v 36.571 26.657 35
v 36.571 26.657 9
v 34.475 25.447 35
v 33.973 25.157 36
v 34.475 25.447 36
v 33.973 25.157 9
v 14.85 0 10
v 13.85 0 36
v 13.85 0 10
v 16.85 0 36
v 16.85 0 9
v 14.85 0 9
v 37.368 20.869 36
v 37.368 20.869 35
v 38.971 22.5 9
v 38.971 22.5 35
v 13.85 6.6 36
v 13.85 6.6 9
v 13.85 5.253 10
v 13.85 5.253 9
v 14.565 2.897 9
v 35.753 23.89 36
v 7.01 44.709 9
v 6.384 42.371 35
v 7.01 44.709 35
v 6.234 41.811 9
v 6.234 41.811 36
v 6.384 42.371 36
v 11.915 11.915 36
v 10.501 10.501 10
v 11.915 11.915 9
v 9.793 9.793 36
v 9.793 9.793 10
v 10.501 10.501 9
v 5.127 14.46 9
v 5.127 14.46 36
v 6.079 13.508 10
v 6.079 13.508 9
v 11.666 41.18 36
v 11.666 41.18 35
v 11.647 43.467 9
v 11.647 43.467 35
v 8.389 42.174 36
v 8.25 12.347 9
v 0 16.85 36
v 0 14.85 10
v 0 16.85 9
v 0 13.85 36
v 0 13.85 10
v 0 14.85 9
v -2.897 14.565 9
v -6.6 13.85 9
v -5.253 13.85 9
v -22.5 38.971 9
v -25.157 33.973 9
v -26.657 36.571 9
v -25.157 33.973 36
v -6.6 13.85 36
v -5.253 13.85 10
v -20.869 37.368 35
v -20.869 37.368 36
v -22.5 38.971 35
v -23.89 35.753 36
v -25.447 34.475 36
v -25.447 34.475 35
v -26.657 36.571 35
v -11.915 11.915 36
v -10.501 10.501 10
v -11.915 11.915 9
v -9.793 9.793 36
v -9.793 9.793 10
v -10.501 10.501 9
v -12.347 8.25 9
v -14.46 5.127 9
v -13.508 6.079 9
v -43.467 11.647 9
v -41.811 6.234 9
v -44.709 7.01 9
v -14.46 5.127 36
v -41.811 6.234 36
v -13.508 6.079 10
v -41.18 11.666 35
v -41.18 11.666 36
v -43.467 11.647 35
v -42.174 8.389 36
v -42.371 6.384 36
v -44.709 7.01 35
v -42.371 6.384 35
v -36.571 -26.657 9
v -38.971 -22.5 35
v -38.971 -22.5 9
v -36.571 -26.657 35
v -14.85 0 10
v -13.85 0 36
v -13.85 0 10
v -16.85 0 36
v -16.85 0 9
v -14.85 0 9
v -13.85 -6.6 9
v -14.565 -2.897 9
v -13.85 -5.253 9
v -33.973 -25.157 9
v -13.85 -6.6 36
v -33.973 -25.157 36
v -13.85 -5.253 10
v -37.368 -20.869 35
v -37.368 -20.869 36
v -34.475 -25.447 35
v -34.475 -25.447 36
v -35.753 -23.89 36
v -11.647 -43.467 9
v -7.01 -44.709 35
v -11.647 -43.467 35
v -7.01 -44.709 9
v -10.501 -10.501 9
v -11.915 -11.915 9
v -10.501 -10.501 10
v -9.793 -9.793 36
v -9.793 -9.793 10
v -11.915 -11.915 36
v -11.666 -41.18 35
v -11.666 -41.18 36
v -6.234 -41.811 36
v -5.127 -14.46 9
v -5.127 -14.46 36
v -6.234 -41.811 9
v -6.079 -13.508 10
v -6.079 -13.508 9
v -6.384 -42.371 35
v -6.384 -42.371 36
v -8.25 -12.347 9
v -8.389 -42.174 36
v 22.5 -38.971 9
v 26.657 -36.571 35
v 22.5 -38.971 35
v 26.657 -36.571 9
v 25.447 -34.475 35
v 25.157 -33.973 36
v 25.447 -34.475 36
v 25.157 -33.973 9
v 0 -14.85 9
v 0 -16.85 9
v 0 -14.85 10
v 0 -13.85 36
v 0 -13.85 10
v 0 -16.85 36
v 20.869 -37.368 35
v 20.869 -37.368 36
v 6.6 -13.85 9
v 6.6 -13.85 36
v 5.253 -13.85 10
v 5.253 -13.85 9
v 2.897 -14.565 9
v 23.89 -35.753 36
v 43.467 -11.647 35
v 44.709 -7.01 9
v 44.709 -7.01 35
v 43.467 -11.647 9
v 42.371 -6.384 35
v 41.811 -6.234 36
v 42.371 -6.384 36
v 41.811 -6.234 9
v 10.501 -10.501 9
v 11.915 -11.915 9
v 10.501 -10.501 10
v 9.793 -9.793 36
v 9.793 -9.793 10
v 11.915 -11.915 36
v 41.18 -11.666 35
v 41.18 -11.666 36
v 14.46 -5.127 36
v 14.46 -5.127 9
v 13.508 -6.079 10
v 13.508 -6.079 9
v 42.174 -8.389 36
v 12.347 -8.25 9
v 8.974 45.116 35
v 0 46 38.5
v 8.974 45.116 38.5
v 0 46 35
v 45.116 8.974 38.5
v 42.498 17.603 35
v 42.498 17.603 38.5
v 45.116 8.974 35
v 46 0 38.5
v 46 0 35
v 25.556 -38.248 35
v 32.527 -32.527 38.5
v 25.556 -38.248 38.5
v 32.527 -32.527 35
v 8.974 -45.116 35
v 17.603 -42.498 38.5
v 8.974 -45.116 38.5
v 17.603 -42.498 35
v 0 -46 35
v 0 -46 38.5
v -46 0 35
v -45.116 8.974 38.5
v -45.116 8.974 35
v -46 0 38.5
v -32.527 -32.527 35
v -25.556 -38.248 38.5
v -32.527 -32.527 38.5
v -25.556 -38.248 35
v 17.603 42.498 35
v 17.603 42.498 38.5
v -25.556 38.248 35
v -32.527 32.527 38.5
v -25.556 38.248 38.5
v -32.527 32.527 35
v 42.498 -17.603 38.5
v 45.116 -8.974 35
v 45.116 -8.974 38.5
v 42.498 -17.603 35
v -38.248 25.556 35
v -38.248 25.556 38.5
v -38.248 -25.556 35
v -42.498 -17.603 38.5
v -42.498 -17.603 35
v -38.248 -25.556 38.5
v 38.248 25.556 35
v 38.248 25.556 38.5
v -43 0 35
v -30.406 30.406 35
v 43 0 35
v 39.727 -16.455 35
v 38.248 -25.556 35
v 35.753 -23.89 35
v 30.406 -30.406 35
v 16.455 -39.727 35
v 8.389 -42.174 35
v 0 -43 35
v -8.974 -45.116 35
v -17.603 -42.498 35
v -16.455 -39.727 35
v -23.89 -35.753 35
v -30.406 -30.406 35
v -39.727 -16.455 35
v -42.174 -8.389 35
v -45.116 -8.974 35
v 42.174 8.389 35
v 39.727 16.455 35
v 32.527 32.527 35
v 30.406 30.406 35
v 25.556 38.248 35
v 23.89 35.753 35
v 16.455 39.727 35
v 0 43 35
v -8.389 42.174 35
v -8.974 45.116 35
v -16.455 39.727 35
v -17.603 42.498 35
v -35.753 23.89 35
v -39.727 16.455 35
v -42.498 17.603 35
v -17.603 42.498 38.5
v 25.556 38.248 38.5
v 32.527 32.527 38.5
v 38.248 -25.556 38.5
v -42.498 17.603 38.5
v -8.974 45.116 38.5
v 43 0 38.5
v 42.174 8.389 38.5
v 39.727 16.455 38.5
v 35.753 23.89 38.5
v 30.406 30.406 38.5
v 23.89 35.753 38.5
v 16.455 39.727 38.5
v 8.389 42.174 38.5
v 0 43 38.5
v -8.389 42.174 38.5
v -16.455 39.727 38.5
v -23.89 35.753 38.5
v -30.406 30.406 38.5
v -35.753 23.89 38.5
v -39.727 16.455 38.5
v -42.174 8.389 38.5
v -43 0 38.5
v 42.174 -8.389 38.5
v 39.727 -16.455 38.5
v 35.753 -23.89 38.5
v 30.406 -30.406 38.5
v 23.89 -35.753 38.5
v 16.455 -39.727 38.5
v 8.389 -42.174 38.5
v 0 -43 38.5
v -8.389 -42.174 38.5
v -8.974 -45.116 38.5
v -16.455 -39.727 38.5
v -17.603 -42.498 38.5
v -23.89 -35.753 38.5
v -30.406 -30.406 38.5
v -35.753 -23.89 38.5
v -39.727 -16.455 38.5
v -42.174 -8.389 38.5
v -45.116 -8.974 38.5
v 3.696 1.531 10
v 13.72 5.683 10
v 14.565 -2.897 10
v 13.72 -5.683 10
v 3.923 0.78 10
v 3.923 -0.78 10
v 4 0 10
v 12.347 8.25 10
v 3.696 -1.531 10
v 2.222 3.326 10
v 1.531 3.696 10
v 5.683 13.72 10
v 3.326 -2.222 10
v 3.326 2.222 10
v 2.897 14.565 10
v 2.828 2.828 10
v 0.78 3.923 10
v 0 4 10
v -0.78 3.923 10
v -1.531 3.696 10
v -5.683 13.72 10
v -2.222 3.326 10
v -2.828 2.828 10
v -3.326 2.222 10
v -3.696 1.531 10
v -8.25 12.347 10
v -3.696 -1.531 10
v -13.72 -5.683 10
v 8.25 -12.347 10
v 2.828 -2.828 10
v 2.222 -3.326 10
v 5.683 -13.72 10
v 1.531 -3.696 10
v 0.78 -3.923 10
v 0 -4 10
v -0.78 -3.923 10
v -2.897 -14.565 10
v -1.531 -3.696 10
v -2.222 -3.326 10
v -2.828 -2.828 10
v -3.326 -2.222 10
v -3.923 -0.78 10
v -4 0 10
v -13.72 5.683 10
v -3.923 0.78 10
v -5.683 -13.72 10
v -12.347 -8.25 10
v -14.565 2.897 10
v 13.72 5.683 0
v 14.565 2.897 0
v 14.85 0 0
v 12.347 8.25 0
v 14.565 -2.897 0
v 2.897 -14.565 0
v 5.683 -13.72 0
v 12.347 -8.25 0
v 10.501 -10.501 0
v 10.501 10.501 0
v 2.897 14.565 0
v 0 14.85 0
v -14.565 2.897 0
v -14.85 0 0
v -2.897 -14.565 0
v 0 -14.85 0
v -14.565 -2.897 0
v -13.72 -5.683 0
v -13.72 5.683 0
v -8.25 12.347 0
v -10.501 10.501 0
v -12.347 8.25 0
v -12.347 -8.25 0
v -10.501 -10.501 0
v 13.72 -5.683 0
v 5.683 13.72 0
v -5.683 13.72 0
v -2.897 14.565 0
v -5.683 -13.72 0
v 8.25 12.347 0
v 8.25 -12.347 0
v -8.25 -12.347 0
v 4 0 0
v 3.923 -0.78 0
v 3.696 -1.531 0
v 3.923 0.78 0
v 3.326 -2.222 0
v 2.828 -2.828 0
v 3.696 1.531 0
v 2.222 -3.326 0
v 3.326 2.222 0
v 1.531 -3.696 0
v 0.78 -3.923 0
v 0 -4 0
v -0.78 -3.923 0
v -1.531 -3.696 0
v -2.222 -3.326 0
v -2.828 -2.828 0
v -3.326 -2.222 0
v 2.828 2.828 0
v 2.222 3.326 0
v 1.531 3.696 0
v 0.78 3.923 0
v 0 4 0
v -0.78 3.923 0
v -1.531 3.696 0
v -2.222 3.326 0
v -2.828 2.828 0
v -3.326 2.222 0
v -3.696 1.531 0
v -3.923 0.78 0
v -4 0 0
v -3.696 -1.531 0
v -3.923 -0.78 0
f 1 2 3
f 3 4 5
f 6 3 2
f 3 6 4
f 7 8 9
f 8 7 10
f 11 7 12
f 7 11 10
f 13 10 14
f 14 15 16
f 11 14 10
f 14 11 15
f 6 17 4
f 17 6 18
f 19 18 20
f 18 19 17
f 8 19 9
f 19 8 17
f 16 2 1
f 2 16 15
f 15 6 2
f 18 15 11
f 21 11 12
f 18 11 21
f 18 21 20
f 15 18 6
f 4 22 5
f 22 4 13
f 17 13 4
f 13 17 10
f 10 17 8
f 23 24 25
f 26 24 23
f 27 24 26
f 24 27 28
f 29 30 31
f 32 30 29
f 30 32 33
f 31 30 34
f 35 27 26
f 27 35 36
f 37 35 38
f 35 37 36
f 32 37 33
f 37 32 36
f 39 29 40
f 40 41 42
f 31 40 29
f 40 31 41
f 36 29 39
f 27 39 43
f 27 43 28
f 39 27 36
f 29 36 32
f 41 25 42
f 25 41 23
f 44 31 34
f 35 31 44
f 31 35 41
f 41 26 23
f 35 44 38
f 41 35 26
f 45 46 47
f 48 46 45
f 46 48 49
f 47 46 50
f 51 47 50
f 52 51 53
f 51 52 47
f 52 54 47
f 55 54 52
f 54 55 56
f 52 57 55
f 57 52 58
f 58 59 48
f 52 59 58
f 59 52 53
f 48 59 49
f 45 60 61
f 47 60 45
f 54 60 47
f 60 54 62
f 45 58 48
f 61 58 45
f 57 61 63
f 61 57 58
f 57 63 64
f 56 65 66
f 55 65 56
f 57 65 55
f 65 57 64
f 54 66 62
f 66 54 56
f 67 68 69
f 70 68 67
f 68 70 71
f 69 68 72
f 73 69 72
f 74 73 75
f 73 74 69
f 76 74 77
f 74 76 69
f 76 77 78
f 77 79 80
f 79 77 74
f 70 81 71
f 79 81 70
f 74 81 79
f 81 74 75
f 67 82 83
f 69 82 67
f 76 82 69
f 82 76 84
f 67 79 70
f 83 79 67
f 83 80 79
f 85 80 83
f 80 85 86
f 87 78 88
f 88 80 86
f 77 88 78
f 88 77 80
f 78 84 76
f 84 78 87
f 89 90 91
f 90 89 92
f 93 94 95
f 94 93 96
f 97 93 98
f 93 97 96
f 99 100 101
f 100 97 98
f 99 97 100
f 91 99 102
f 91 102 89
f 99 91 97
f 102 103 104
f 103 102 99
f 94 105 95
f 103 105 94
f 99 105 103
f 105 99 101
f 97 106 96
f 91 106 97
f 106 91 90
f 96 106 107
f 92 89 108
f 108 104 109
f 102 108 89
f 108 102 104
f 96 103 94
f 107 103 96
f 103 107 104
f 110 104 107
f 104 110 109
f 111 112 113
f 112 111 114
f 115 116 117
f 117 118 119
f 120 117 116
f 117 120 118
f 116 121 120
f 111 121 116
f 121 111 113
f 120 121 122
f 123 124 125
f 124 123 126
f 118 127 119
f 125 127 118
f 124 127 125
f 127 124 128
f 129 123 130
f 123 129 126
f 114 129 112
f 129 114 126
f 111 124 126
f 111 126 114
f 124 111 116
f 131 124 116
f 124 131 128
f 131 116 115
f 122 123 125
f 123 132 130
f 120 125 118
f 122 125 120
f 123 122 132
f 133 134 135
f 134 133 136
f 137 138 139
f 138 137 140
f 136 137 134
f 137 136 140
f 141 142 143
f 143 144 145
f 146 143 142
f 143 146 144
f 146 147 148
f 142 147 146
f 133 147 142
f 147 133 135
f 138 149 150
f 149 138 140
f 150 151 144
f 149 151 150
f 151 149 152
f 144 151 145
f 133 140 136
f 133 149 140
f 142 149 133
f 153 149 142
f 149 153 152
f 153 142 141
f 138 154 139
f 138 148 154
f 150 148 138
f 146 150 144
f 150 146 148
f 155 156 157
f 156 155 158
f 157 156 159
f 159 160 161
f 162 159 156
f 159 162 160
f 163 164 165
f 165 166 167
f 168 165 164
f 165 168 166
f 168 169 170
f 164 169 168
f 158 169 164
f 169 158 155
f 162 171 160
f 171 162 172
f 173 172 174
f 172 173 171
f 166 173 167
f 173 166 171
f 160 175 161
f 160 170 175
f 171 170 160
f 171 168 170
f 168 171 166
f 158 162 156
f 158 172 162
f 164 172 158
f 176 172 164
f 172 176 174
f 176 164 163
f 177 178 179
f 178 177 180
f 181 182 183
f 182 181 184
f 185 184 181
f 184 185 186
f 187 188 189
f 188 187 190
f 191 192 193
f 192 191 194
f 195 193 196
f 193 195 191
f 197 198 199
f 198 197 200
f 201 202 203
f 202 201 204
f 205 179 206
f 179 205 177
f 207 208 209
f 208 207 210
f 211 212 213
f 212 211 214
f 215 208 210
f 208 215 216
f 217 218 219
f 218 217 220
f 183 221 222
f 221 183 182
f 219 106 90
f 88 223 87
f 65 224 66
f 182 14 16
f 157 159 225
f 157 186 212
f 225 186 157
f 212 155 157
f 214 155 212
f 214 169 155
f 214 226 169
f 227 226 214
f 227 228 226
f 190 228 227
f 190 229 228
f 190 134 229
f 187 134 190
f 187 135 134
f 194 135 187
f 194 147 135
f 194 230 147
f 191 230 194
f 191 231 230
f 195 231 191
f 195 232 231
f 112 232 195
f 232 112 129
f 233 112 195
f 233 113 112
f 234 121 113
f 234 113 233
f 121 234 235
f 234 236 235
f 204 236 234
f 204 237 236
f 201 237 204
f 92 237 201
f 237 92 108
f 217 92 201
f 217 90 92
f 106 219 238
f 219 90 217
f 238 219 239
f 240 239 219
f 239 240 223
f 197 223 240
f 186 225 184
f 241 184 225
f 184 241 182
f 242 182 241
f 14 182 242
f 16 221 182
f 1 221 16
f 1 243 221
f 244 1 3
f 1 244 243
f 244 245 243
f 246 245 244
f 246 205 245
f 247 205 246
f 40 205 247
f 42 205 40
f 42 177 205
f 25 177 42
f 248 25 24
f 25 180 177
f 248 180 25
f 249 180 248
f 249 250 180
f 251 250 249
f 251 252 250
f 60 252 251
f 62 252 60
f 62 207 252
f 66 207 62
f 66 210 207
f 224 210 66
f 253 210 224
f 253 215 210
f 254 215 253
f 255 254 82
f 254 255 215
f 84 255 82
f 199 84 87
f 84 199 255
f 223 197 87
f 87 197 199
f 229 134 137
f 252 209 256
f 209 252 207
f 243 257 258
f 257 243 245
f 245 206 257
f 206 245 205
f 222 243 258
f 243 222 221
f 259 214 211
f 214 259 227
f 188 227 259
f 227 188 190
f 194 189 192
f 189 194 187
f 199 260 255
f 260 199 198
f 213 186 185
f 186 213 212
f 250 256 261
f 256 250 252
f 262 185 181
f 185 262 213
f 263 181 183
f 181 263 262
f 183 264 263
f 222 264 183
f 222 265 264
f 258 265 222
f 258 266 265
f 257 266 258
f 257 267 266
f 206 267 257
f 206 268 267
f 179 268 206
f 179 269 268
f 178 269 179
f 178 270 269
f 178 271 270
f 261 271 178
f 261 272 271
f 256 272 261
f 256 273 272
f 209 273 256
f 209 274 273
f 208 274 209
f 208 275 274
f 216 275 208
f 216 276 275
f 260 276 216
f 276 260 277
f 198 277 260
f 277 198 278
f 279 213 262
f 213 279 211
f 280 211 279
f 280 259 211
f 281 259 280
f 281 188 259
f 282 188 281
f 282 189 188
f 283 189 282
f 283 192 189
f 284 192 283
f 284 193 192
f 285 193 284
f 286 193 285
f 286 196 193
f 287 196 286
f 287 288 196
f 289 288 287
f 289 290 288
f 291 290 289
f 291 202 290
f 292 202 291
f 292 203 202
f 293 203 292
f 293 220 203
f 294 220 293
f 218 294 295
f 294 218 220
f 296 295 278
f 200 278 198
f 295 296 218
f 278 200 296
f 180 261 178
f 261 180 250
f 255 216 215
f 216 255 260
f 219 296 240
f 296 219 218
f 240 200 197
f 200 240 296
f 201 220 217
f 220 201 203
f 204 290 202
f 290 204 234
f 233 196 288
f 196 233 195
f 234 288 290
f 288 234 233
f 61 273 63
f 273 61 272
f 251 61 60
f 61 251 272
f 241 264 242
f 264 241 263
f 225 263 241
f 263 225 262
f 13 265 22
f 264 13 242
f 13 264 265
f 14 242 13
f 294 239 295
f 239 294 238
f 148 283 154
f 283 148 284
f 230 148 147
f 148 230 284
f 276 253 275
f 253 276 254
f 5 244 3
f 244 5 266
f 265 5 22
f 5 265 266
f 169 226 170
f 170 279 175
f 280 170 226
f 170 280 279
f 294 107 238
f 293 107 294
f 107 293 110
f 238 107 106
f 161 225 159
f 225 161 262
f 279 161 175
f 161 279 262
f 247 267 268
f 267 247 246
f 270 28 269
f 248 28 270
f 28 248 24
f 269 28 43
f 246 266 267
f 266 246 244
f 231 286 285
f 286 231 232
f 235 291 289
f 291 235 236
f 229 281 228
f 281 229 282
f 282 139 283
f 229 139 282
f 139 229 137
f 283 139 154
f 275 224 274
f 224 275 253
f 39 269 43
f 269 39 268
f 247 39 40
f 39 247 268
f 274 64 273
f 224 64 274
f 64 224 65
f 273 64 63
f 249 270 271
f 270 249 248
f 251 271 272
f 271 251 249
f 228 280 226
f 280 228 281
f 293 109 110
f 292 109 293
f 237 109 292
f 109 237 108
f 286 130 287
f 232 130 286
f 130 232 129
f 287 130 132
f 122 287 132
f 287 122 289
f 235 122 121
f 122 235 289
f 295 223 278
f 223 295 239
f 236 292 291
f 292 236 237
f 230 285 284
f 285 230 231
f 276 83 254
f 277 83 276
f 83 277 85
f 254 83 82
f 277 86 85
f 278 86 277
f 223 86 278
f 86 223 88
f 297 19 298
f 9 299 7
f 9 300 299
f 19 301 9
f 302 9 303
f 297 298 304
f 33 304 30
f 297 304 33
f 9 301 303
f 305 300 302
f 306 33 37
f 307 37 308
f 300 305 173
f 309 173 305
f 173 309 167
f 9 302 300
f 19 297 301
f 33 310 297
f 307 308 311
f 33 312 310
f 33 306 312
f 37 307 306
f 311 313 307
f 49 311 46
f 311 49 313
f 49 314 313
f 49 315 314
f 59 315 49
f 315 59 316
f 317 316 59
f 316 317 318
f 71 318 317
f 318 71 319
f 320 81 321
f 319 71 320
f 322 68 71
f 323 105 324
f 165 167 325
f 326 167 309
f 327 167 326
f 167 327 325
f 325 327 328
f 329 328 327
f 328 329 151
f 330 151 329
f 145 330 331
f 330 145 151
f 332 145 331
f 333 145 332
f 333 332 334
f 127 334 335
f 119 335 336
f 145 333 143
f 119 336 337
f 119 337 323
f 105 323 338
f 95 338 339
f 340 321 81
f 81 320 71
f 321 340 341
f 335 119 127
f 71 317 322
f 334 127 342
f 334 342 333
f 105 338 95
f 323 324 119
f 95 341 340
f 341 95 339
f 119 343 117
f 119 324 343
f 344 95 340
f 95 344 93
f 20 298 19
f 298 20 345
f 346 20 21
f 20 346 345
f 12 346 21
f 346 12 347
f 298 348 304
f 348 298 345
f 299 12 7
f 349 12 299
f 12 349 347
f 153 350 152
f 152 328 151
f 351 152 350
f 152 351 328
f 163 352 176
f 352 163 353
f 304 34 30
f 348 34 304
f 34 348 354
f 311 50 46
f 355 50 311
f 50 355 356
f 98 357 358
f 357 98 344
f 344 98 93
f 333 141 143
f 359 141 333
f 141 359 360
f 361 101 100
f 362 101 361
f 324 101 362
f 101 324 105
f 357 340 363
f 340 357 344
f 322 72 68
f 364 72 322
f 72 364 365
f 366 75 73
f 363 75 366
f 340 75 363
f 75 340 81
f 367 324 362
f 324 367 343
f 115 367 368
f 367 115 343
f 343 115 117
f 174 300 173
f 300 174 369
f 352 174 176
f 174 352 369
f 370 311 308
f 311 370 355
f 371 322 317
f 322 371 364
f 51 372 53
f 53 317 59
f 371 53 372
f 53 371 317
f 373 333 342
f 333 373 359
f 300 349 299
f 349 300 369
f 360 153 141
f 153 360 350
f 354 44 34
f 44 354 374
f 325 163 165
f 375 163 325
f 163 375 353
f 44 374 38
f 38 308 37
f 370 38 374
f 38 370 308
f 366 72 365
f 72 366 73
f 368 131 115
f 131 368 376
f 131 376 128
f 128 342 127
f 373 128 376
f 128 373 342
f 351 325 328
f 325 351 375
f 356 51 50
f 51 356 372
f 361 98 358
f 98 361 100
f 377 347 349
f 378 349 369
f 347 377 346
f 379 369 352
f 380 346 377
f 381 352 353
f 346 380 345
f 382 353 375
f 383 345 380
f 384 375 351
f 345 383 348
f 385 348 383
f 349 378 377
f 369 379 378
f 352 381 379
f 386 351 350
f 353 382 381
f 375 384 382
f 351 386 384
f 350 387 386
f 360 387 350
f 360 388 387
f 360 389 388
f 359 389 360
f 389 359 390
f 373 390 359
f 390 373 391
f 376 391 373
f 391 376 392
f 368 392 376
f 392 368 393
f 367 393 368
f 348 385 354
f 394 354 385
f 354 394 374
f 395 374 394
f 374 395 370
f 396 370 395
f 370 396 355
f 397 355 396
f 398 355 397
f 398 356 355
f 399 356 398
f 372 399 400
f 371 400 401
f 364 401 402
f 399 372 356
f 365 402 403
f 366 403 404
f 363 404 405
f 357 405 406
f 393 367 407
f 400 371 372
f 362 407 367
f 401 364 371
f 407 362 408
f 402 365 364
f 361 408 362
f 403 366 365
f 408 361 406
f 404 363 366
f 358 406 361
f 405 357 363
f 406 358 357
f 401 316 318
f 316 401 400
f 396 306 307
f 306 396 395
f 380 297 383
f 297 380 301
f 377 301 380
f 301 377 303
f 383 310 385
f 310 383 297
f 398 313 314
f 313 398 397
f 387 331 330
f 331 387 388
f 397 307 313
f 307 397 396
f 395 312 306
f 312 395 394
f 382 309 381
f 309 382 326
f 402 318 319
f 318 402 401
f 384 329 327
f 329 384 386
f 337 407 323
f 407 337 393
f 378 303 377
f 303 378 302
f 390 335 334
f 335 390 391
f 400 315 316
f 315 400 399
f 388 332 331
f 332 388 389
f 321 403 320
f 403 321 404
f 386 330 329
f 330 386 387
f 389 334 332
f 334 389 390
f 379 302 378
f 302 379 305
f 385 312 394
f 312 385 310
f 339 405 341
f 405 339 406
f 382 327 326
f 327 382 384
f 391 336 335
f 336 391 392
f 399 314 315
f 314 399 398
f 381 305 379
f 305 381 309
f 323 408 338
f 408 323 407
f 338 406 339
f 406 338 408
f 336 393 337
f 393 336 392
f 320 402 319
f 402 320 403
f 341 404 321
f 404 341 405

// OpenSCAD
$fn = 32;

// ----------------------------------------------------------------------
// Impeller: 90 mm, 8 blades, 38.5 mm tall
// ----------------------------------------------------------------------

// --- parameters (mm) ---
hub_d = 29.7;             // hub diameter
hub_h = 10;               // hub height
imp_d = 90;               // outer diameter over the blades
blades = 8;               // number of blades
blade_t = 3;              // blade thickness
blade_h = 26;             // blade height
blade_in_r = 13.85;       // blade root radius
blade_out_r = 42;         // blade tip radius
sweep = 30;               // blade sweep, degrees
bore_d = 8;               // shaft bore
shroud_h = 2.5;           // shroud ring thickness
shroud_d = 92;            // shroud outside diameter

module hub() {
  cylinder(h = hub_h, d = hub_d);
}

module blade() {
  /* blade swept between two boxes: hull of the root and the tip section */
  hull() {
    translate([blade_in_r, 0, hub_h - 1])
      cube([blade_t, blade_t * 2.2, blade_h + 1], center = false);
    rotate([0, 0, sweep])
      translate([blade_out_r, 0, hub_h - 1])
        cube([blade_t, blade_t * 1.6, blade_h + 1], center = false);
  }
}

module blades() {
  for (i = [0 : blades - 1])
    rotate([0, 0, i * 360 / blades]) blade();
}

module shroud() {
  translate([0, 0, hub_h + blade_h - 1])
    difference() {
      cylinder(h = shroud_h + 1, d = shroud_d);
      translate([0, 0, -1]) cylinder(h = shroud_h + 3, d = shroud_d - 2 * 3);
    }
}

difference() {
  union() {
    hub();
    blades();
    shroud();
  }
  translate([0, 0, -1]) cylinder(h = hub_h + blade_h + shroud_h + 3, d = bore_d);
}
